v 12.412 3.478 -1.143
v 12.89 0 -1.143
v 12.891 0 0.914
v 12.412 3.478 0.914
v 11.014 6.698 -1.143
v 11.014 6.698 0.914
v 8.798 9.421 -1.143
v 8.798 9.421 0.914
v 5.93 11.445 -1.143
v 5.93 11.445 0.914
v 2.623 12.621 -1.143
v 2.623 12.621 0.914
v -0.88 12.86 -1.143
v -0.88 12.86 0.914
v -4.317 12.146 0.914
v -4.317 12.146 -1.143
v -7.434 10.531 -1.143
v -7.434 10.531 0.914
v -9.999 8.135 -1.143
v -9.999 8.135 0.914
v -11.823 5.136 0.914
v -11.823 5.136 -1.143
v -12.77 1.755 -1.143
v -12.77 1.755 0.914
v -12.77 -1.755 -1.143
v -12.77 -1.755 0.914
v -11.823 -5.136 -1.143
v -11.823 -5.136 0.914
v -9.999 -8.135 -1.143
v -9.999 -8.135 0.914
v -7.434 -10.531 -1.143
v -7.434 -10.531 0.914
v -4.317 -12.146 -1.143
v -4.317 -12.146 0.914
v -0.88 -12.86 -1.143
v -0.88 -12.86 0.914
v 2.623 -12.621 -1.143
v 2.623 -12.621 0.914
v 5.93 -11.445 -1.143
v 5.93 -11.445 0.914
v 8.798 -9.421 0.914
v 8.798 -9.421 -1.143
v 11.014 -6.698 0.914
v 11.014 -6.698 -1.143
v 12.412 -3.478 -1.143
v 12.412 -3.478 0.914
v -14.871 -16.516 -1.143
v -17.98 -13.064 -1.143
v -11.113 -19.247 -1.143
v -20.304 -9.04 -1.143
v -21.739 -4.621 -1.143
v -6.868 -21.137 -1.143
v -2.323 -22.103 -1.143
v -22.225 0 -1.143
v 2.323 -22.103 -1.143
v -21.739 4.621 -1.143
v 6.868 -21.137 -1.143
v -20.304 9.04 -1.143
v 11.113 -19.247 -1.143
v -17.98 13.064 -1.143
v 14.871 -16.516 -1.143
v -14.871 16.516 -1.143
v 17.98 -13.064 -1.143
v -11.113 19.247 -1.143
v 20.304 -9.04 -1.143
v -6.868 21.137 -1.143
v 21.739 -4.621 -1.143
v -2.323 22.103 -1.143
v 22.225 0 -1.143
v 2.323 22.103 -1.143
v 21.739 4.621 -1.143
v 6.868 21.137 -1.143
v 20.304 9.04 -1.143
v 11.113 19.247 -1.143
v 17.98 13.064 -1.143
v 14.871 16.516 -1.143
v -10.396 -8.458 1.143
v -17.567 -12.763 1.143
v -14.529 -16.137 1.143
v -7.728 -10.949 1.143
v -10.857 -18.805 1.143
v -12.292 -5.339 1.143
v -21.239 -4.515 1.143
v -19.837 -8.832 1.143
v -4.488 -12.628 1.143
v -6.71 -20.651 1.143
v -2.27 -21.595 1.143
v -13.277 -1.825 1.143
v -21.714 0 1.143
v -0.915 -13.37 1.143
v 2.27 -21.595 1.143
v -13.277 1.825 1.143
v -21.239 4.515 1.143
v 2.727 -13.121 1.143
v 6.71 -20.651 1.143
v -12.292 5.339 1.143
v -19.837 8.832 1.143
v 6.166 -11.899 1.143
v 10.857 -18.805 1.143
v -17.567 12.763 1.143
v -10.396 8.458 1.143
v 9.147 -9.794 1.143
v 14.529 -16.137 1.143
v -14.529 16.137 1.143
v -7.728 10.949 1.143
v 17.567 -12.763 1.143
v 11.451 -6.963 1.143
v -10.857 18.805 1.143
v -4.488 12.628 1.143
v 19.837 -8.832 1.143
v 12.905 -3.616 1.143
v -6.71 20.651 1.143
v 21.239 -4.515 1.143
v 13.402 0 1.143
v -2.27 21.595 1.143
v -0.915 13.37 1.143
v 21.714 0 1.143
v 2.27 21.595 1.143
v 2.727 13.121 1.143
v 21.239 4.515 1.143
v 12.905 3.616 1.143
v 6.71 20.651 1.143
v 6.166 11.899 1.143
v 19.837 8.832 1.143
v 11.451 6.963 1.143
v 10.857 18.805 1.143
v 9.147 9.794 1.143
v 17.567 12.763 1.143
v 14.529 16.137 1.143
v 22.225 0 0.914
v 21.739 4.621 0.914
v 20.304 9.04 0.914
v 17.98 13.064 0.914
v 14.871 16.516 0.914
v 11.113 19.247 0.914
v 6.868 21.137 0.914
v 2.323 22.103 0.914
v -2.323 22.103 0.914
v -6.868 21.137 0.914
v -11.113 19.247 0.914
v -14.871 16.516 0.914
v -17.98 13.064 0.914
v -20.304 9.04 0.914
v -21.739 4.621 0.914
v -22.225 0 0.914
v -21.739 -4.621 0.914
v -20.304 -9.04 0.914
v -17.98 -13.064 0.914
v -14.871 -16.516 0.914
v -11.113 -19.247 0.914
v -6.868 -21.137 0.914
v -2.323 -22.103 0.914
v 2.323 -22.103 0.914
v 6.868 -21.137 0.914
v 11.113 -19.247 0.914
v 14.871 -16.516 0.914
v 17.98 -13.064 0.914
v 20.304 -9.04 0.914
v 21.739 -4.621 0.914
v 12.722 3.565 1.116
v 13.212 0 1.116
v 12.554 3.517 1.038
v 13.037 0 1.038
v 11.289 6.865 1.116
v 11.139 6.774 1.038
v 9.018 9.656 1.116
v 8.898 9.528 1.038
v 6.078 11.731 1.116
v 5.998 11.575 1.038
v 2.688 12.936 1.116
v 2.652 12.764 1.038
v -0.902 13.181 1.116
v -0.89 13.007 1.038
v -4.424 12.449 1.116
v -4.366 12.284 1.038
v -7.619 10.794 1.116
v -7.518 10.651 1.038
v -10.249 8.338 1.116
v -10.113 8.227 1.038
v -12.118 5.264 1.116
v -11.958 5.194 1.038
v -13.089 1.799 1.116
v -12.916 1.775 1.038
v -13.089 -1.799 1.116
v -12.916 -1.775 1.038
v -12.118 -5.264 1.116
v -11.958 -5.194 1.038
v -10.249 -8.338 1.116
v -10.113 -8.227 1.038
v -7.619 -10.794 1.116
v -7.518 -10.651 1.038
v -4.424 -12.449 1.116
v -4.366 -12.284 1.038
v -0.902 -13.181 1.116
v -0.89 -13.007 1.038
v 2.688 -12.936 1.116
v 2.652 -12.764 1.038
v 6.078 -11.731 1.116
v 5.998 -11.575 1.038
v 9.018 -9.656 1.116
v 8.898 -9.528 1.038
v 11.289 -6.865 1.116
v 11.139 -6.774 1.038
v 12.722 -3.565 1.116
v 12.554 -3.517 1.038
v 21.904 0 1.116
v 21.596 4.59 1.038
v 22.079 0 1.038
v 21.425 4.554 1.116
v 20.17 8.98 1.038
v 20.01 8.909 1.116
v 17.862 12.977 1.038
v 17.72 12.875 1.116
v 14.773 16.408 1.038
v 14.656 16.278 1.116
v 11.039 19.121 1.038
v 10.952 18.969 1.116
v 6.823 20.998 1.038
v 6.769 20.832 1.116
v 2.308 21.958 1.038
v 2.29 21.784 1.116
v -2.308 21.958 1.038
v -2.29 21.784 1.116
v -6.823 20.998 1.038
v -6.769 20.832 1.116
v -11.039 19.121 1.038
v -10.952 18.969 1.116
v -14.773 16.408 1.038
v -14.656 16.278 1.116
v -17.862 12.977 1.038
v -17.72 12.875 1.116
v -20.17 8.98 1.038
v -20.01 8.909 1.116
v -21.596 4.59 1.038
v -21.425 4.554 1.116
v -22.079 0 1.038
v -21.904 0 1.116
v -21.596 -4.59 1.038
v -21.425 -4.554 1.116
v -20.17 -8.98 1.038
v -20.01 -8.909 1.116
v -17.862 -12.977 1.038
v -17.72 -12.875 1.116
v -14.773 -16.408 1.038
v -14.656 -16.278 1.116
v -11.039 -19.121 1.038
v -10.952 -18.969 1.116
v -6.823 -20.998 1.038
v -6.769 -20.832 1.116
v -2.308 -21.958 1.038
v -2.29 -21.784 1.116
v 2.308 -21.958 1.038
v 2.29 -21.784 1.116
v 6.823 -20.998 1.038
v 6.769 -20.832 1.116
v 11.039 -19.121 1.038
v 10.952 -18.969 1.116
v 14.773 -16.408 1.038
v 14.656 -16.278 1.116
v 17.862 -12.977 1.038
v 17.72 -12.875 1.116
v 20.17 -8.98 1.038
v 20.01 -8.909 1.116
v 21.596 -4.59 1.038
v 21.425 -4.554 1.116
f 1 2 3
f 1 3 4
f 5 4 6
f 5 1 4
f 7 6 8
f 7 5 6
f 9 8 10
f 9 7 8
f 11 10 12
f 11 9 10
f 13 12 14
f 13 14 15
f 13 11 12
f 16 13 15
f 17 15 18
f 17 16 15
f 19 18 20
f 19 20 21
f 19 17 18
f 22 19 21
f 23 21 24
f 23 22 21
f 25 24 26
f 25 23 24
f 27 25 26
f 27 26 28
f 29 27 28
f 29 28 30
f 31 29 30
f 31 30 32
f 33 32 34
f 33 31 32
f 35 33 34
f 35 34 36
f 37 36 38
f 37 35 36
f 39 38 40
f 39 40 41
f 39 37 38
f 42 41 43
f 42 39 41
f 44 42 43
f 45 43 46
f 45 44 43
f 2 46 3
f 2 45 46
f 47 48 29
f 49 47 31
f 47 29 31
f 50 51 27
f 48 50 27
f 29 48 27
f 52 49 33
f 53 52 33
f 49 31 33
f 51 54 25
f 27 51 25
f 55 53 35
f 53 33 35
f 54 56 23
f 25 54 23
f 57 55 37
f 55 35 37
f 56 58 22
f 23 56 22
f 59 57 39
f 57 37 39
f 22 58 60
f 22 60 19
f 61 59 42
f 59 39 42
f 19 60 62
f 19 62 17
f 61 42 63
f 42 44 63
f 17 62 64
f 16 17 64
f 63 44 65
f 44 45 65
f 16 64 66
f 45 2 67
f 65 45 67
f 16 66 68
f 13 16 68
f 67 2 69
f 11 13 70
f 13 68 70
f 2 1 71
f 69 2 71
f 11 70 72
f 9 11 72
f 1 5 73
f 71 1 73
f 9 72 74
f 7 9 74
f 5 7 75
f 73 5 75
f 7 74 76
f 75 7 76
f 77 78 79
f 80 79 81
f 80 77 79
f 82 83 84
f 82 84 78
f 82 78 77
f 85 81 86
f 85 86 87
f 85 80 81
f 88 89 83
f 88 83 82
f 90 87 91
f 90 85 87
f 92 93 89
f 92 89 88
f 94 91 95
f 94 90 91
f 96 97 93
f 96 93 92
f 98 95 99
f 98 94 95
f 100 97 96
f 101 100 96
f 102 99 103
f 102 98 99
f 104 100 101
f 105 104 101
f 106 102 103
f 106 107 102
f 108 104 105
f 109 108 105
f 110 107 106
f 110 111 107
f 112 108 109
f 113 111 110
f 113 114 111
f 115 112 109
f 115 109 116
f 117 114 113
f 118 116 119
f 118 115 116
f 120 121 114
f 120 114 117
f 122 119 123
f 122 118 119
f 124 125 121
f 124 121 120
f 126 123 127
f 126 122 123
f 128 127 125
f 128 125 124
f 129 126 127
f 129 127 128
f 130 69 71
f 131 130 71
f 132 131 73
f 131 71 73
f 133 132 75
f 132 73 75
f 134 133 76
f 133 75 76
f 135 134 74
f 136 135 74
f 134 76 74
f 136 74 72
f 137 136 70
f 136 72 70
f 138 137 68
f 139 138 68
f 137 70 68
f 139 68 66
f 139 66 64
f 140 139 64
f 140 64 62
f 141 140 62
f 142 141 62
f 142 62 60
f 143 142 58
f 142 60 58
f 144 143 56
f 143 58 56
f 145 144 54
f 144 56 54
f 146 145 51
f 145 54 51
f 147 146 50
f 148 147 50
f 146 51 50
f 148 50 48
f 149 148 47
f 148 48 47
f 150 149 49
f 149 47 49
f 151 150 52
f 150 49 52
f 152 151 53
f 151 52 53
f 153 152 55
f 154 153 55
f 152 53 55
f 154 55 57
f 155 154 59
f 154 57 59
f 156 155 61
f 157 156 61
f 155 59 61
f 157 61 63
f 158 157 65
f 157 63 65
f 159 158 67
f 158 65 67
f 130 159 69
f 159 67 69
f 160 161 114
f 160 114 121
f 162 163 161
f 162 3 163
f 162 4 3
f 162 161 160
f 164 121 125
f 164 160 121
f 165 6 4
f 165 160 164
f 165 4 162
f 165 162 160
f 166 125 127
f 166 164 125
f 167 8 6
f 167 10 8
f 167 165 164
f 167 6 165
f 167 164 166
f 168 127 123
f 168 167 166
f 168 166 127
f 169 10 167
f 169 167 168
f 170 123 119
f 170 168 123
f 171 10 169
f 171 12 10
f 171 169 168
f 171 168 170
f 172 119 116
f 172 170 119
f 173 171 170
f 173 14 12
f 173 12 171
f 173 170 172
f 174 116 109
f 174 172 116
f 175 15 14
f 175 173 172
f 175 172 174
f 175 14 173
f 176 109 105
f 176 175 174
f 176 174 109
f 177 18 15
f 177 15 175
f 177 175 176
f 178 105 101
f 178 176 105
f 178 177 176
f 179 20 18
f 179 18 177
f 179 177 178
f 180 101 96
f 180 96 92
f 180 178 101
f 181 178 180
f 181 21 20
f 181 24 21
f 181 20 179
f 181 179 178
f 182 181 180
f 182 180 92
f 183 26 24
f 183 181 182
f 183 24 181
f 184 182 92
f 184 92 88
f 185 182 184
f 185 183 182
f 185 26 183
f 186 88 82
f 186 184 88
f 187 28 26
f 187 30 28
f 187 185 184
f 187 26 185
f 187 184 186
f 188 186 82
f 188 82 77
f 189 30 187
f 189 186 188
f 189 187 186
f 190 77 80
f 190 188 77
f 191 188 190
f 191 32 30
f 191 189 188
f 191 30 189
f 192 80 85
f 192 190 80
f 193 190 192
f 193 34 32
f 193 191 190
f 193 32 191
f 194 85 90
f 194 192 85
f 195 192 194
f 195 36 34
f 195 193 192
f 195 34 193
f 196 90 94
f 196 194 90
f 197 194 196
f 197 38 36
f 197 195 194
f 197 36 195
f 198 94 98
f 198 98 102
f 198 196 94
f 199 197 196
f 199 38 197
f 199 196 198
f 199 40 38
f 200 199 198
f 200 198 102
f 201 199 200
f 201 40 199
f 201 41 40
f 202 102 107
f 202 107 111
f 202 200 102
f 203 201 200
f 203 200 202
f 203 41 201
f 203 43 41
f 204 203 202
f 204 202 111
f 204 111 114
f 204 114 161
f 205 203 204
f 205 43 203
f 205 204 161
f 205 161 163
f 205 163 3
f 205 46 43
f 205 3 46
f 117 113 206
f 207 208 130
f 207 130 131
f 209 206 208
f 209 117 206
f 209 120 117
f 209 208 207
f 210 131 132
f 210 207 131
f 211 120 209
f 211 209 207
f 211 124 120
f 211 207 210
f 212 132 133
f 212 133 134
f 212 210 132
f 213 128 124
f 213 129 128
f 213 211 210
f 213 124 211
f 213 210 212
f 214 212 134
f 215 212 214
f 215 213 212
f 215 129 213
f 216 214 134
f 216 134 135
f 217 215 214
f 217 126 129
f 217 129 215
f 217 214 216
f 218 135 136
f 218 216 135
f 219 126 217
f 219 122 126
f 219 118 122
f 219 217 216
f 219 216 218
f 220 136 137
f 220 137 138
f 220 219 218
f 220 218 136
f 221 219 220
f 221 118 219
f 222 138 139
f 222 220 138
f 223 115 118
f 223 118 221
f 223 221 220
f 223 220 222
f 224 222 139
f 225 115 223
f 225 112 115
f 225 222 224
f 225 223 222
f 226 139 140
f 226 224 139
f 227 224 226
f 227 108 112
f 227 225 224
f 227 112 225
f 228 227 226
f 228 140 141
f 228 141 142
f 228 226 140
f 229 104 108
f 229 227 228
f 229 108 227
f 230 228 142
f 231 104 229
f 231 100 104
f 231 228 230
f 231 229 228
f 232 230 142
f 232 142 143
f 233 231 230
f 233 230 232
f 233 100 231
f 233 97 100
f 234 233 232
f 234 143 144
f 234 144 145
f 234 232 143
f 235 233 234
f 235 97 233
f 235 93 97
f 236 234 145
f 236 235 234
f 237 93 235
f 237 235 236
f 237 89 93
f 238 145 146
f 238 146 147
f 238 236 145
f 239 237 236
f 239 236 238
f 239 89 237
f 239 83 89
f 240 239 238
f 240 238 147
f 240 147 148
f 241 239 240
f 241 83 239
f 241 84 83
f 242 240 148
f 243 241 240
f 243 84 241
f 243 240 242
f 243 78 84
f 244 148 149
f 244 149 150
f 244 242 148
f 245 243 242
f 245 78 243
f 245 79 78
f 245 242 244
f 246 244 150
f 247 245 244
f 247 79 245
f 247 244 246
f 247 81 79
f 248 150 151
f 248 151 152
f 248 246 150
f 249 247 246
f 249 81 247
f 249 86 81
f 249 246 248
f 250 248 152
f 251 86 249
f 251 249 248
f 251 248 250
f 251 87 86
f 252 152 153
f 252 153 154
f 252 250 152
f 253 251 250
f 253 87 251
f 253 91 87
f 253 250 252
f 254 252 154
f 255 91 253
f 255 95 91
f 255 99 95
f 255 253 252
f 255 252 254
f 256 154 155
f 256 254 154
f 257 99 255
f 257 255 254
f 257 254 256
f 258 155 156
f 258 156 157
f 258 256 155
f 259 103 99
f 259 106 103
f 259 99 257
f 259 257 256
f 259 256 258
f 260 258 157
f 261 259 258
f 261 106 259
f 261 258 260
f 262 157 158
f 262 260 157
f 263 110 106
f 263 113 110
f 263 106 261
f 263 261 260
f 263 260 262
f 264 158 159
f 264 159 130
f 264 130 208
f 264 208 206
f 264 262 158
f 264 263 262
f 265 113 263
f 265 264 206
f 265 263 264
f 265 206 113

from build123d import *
from OCP.BRepFilletAPI import BRepFilletAPI_MakeChamfer

# Parameters (mm, degrees)
BOSS_EXTRUDE1_START = -1.143
SKETCH3_R           = 22.225
SKETCH3_R_2         = 12.8905
BOSS_EXTRUDE1_DEPTH = 2.286
CHAMFER1_SIZE       = 0.2286
CHAMFER1_SIZE2      = 0.131982272
FILLET1_R           = 0.6858


with BuildPart() as part:
    # Sketch3 → Boss-Extrude1 (new body)
    with BuildSketch(Plane.XY.offset(BOSS_EXTRUDE1_START)):
        Circle(SKETCH3_R)
        Circle(SKETCH3_R_2, mode=Mode.SUBTRACT)
    extrude(amount=BOSS_EXTRUDE1_DEPTH)

    # Chamfer1: one chamfer whose edges measure the first distance from different faces: ONE call of the kernel's chamfer builder (chamfer() names one face for all edges)
    chamfer1_edges_1 = [part.edges().sort_by_distance(p)[0] for p in [
        (-22.225, 0, 1.143),
    ]]
    chamfer1_side_1 = [part.faces().sort_by_distance(p)[0] for p in [
        (-22.225, 0, 0),
    ]]
    chamfer1_edges_2 = [part.edges().sort_by_distance(p)[0] for p in [
        (-12.8905, 0, 1.143),
    ]]
    chamfer1_side_2 = [part.faces().sort_by_distance(p)[0] for p in [
        (-12.8905, 0, 0),
    ]]
    chamfer1 = BRepFilletAPI_MakeChamfer(part.part.solid().wrapped)
    for e in chamfer1_edges_1:
        chamfer1.Add(CHAMFER1_SIZE, CHAMFER1_SIZE2, e.wrapped, chamfer1_side_1[0].wrapped)  # the first distance lies on this face
    for e in chamfer1_edges_2:
        chamfer1.Add(CHAMFER1_SIZE, CHAMFER1_SIZE2, e.wrapped, chamfer1_side_2[0].wrapped)  # the first distance lies on this face
    add(Compound.cast(chamfer1.Shape()), mode=Mode.REPLACE)

    # Fillet1
    # the kernel refuses this fillet: 0.6858 mm, written as the material it takes off along each edge
    with BuildSketch(Plane(origin=(0, 0, 1.143), x_dir=(1, 0, 0), z_dir=(0, -1, 0))) as fillet1_piece_1:
        with BuildLine():
            CenterArc((21.71383486, -0.6858), FILLET1_R, 41.810314896, 48.189685104)
            Line((21.71383486, 0), (21.71383486, 0.013716))
            Line((21.71383486, 0.013716), (22.093017728, 0.013716))
            Line((22.093017728, 0.013716), (22.104896133, 0.006858))
            ThreePointArc((22.104896133, 0.006858), (22.170887269, -0.107442), (22.235223303, -0.219456))
            Line((22.235223303, -0.219456), (22.225, -0.2286))
        make_face()
    revolve(axis=Axis((0, 0, 1.143), (0, 0, 1)), mode=Mode.SUBTRACT)
    with BuildSketch(Plane(origin=(0, 0, 1.143), x_dir=(1, 0, 0), z_dir=(0, -1, 0))) as fillet1_piece_2:
        with BuildLine():
            CenterArc((13.40166514, -0.6858), FILLET1_R, 90, 48.189685104)
            Line((12.8905, -0.2286), (12.880276697, -0.219456))
            ThreePointArc((12.880276697, -0.219456), (12.944612731, -0.107442), (13.010603867, 0.006858))
            Line((13.010603867, 0.006858), (13.022482272, 0.013716))
            Line((13.022482272, 0.013716), (13.40166514, 0.013716))
            Line((13.40166514, 0.013716), (13.40166514, 0))
        make_face()
    revolve(axis=Axis((0, 0, 1.143), (0, 0, 1)), mode=Mode.SUBTRACT)


solid = part.part
